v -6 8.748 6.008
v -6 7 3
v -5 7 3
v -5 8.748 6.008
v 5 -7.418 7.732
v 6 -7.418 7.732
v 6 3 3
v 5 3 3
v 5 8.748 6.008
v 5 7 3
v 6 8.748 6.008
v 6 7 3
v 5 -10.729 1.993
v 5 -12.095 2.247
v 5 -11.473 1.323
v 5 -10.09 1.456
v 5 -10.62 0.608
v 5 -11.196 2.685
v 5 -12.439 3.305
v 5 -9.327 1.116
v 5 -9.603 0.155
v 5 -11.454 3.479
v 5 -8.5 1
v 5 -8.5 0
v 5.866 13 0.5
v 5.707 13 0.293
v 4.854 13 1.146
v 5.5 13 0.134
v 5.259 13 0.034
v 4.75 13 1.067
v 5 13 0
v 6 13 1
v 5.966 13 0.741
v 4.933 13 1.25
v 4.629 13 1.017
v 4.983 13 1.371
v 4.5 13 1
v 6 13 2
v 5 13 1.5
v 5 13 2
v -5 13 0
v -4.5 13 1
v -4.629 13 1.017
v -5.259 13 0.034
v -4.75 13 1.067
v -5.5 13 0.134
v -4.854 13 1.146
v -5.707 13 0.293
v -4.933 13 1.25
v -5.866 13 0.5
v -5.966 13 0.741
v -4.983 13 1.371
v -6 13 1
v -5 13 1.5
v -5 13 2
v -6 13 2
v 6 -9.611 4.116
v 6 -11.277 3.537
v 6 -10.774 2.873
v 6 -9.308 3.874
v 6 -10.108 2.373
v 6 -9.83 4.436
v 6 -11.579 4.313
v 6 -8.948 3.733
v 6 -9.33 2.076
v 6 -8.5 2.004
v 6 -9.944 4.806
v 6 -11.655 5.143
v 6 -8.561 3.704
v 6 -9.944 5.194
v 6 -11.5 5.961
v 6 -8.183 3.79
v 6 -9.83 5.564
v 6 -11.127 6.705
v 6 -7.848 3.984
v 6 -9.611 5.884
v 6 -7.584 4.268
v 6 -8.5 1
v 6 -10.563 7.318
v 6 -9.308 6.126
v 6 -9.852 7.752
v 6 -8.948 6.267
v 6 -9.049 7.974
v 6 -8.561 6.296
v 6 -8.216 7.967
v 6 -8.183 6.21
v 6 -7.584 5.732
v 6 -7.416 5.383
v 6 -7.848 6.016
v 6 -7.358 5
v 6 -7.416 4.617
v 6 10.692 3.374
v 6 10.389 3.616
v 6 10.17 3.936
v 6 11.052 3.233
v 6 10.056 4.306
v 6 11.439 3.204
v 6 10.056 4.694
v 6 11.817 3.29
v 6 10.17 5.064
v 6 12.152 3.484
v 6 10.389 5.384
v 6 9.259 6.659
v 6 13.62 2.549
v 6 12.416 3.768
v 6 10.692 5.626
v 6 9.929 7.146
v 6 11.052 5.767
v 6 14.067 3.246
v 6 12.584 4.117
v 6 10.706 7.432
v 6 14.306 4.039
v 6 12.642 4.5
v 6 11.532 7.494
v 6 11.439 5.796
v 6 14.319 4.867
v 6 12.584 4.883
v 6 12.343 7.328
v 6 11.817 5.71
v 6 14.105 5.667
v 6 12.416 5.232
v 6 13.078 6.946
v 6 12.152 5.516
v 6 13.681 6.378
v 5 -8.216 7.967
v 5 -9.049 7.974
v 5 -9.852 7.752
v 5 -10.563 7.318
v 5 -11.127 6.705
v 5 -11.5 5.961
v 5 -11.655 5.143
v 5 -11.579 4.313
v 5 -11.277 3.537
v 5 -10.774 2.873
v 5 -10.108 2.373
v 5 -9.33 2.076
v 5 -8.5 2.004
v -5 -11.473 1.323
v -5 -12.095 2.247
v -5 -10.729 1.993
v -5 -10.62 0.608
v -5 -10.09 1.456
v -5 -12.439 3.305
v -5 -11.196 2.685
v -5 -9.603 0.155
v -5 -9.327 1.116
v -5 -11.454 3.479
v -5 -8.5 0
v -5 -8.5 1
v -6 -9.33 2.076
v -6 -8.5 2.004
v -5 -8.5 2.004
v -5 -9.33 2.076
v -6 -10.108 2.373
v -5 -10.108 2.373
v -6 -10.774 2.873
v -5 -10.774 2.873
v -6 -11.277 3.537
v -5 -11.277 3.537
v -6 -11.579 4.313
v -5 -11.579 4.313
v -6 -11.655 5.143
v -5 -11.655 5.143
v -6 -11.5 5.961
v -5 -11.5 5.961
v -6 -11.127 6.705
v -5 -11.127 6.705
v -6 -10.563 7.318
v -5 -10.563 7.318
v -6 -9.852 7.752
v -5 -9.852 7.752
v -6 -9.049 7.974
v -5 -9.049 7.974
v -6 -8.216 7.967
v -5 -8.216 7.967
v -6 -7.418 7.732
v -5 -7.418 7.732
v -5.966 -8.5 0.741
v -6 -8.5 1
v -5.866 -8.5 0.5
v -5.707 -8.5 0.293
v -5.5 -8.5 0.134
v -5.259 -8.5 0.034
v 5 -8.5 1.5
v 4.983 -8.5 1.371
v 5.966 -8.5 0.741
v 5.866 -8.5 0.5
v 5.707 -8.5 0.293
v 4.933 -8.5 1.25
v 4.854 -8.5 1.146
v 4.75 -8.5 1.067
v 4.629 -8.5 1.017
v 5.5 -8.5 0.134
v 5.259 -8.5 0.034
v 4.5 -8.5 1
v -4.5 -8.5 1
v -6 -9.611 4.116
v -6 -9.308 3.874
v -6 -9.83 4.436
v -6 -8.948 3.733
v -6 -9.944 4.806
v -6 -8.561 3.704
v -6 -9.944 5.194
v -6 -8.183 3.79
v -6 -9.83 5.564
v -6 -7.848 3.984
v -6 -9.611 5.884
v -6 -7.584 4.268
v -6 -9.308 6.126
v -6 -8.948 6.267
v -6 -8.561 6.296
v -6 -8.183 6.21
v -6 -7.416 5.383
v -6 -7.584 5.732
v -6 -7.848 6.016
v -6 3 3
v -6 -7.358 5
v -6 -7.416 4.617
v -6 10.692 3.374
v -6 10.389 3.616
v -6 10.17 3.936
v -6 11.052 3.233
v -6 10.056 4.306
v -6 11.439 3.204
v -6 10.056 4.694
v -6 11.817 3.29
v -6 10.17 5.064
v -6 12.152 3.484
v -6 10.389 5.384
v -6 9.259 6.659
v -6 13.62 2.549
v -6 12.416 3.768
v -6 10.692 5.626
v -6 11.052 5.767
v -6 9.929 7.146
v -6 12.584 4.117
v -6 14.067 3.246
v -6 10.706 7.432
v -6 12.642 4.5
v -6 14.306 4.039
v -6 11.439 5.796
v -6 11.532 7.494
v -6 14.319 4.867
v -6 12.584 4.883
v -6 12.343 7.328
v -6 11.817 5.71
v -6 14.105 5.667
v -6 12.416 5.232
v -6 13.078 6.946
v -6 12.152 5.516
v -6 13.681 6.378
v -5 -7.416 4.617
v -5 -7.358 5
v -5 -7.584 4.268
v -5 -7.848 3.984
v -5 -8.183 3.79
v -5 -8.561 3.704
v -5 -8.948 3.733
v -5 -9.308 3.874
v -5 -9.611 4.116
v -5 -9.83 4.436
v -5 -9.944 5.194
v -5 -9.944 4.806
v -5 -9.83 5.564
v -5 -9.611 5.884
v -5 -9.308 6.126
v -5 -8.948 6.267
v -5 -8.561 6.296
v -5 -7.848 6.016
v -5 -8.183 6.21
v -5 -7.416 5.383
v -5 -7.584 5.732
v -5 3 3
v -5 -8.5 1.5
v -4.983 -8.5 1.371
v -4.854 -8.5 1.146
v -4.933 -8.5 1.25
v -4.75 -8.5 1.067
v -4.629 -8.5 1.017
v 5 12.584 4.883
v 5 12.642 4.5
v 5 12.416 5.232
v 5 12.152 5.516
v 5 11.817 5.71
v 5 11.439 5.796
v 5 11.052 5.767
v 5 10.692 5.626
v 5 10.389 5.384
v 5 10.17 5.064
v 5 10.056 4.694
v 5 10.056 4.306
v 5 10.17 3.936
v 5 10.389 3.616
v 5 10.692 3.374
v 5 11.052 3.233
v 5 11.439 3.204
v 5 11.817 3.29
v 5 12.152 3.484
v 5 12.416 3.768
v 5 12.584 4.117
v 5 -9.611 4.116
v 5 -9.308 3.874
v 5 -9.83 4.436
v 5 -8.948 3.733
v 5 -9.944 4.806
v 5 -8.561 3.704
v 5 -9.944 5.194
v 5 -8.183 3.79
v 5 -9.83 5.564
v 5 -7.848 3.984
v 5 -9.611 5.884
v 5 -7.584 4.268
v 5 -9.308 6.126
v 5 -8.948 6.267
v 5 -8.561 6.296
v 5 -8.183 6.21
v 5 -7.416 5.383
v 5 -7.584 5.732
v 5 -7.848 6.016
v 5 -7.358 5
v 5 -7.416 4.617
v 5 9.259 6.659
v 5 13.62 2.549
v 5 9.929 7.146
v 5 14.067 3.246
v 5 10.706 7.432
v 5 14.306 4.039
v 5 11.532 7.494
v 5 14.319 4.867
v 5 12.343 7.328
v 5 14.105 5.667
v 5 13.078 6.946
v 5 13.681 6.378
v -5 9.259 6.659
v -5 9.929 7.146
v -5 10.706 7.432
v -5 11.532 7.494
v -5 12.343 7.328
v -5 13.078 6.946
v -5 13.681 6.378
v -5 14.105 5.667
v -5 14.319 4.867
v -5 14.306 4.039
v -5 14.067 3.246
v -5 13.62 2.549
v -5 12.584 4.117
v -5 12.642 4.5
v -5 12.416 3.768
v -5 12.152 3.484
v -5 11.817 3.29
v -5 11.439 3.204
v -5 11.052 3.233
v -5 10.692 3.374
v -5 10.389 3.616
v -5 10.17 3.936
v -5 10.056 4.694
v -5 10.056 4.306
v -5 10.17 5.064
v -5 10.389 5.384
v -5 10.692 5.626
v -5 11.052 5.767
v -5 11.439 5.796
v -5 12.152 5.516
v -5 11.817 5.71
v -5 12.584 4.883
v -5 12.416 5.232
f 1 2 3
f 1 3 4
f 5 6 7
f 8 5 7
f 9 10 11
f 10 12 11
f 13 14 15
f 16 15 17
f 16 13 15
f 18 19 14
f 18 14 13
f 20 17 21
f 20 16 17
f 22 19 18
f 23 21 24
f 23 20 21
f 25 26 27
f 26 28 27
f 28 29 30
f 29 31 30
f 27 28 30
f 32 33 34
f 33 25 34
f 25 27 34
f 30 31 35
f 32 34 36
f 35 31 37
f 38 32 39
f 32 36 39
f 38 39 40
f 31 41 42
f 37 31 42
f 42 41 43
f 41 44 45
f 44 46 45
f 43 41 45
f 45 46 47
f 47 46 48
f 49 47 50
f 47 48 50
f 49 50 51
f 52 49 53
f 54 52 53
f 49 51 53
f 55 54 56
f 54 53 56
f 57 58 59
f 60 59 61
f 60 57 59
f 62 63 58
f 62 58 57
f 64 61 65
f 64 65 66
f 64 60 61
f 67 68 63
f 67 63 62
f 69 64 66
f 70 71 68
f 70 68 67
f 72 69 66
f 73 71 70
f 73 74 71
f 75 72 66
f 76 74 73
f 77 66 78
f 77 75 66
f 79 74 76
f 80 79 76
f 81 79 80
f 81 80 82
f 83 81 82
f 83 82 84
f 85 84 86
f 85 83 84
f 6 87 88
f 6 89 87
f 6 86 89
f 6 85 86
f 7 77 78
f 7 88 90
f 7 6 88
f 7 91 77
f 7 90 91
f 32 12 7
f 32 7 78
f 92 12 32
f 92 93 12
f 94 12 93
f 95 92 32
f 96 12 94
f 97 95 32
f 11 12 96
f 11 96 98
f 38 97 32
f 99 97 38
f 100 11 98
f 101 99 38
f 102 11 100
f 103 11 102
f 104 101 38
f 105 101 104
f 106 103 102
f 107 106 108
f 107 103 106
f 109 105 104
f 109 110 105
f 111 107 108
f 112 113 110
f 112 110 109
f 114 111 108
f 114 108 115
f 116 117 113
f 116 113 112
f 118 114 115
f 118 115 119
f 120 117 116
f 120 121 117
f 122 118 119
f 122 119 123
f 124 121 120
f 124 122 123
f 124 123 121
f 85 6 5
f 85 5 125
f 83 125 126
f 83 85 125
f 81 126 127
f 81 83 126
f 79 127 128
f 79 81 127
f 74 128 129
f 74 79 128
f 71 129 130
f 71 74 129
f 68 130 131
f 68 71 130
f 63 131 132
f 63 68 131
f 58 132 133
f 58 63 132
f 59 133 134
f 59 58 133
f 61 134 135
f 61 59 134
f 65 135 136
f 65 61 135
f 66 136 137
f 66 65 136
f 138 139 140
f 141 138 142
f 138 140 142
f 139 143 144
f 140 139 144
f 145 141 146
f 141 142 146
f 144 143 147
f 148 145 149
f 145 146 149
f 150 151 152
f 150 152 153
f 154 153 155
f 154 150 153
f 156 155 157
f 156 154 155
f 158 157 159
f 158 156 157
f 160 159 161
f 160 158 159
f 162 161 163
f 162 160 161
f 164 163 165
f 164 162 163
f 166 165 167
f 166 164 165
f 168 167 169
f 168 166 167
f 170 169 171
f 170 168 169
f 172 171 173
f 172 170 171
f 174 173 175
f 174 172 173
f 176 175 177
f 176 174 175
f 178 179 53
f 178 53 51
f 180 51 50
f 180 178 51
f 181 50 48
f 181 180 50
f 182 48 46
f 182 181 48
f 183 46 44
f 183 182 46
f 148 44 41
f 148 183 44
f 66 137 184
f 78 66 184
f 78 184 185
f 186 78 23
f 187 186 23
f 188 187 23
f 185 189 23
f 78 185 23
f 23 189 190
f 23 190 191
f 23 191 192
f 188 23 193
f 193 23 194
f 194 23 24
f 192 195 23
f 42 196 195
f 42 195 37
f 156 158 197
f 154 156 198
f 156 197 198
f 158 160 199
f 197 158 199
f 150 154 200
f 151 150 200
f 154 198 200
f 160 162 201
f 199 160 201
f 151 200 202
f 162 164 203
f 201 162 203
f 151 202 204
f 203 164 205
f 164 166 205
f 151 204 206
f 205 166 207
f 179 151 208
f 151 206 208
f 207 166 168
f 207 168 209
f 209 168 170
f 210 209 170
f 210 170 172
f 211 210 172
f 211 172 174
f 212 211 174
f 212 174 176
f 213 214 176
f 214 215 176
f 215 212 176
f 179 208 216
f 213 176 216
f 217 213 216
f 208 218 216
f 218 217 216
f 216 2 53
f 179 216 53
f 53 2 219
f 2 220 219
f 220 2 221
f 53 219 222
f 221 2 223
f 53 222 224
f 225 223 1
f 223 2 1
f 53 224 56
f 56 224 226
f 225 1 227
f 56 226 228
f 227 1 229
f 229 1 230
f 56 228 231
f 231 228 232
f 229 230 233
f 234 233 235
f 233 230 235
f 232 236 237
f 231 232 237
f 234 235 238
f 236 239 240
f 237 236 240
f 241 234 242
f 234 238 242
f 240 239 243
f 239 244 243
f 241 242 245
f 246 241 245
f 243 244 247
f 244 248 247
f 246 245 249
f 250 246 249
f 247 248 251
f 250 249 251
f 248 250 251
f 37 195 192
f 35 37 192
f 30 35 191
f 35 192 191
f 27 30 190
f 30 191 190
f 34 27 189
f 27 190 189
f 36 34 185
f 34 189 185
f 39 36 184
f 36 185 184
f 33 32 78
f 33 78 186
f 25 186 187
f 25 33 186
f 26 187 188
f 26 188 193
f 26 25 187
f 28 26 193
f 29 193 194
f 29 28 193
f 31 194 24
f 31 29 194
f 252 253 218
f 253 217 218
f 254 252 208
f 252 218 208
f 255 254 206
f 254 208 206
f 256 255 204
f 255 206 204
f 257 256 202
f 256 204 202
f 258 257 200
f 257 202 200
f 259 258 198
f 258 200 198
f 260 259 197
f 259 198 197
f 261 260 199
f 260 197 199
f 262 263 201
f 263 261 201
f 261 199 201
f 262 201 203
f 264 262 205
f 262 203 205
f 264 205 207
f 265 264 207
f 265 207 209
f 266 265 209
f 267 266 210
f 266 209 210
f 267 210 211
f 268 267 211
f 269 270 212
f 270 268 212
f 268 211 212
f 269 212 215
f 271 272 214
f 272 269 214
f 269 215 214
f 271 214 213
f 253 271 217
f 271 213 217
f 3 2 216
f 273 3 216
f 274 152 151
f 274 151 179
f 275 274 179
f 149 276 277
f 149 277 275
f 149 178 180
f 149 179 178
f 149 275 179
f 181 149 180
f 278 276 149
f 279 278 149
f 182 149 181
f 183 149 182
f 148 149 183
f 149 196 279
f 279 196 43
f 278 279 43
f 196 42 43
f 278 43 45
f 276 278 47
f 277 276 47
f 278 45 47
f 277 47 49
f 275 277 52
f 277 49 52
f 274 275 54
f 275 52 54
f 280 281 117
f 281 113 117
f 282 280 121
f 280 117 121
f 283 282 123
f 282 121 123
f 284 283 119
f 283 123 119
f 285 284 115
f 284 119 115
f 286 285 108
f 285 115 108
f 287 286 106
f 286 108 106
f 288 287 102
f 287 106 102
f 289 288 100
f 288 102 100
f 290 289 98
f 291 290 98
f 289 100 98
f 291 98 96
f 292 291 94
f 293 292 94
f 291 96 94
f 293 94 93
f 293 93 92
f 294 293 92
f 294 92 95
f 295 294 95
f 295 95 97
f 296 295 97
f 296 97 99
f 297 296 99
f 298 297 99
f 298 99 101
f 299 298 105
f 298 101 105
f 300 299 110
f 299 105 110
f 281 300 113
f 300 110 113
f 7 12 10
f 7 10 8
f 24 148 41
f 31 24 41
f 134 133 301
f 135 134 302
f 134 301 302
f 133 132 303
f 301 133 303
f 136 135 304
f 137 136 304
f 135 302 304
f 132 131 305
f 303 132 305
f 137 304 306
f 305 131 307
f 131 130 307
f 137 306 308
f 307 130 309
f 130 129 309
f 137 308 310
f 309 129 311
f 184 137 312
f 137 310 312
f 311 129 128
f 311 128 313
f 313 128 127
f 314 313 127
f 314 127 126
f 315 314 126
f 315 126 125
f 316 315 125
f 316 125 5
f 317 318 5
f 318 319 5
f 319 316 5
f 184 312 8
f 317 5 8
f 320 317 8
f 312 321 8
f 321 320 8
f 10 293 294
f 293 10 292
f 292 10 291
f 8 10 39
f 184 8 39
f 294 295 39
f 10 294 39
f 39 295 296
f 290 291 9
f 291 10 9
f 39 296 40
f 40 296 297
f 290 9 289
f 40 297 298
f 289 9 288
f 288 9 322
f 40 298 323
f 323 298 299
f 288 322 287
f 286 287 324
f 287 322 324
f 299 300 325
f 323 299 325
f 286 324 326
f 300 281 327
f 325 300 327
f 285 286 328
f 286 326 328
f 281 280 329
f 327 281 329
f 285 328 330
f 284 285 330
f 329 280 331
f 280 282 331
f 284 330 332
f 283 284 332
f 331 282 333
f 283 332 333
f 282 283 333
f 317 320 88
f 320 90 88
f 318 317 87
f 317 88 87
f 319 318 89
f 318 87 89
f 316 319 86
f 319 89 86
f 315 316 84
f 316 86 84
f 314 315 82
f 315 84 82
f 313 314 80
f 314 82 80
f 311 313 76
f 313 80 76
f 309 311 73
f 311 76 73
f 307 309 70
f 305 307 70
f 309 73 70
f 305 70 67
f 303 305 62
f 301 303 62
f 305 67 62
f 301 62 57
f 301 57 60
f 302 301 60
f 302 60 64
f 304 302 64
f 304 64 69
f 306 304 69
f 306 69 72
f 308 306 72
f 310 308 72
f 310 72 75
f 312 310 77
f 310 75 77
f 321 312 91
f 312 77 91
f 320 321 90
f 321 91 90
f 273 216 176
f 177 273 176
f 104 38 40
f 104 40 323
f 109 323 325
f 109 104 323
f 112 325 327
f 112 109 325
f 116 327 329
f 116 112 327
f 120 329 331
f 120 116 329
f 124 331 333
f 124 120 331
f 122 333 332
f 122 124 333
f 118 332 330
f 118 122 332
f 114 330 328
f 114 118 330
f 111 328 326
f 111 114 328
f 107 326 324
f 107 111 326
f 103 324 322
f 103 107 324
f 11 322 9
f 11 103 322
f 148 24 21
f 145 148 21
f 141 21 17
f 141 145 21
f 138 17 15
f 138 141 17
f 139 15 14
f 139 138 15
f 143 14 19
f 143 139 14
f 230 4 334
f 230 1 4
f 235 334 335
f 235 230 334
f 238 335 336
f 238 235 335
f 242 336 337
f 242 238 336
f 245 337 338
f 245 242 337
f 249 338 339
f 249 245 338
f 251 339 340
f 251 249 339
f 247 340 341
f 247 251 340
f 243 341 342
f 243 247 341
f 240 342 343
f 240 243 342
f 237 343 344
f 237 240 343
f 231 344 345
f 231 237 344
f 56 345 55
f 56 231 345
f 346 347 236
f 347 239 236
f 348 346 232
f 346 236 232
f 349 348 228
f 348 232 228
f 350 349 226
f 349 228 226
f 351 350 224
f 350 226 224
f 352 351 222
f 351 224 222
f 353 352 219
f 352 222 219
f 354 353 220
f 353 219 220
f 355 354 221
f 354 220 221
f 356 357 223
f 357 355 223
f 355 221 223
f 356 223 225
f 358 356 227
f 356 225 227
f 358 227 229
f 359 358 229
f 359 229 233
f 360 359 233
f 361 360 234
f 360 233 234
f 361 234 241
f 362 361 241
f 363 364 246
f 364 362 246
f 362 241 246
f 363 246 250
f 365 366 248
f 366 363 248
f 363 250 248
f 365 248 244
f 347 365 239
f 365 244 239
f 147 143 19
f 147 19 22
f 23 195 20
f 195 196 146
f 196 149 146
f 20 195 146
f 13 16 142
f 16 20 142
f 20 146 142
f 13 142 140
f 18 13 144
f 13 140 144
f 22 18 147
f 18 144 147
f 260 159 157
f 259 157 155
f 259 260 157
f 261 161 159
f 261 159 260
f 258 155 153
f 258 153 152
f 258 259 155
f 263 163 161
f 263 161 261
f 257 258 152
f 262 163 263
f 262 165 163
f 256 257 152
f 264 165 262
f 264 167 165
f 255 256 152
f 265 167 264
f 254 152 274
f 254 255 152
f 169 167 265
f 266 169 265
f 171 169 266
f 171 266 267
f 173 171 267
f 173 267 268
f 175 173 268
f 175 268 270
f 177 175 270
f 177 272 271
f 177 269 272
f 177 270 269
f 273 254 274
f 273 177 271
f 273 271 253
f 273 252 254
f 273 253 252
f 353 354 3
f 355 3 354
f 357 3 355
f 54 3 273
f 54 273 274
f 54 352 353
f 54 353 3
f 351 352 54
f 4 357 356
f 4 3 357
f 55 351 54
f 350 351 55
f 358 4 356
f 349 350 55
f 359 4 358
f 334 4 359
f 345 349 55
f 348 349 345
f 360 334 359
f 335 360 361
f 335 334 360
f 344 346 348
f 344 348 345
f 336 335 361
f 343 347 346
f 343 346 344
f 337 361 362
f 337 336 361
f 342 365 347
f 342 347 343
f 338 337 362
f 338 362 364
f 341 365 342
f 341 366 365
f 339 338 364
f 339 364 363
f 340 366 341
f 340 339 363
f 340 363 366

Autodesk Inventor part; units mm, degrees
ref_plane "YZ Plane" through (0, 0, 0) normal (1, 0, 0) x (0, 1, 0)
ref_plane "XZ Plane" through (0, 0, 0) normal (0, 1, 0) x (-1, 0, 0)
ref_plane "XY Plane" through (0, 0, 0) normal (0, 0, 1) x (1, 0, 0)
sketch "Sketch2" plane through (0, 0, 0) normal (1, 0, 0) x (0, 1, 0)
  line L0 (0, 10.4889) -> (0, -1.7482) projected
  line L1 (-17.7123, 0) -> (21.1316, 0) projected
  line L2 (13, 0) -> (13, 2)
  arc A0 (-7.4177, 7.7315) -> (-8.5, 2.0042) centre (-8.6583, 5) ccw
  line L3 (-8.5, 2.0042) -> (-8.5, 0)
  line L4 (7, 3) -> (8.7479, 6.0075)
  arc A1 (13, 2) -> (8.7479, 6.0075) centre (11.3417, 4.5) ccw
  circle A2 centre (11.3417, 4.5) radius 1.3
  circle A3 centre (-8.6583, 5) radius 1.3
  line L5 (7, 3) -> (3, 3)
  line L6 (3, 3) -> (-7.4177, 7.7315)
  dimension "d0" = 21.5
  dimension "d2" = 3
  dimension "d3" = 2
  dimension "d6" = 3
  dimension "d7" = 4.5
  dimension "d8" = 1.6583
  dimension "d9" = 5
  dimension "d10" = 20
  dimension "d16" = 3
  dimension "d17" = 2.6
  dimension "d30" = 13
  dimension "d31" = 4
  dimension "d32" = 6
extrude "Extrusion1" add sketch "Sketch2" along normal mid plane 12
fillet "Fillet1" radius 1 2 edges at (6, 2.25, 0) (-6, 2.25, 0)
shell "Shell1" thickness 1 removed faces 9 at (2, -9.3053, 7.9294) at (2, 8.1653, 5.005) at (2, 13.3771, 2.2962) at (1.6667, -8.5, 1.3361) at (-1.6667, 13, 1.3333) at (2, 12.6249, 4.2915) at (2, -7.3751, 4.7915) at (-2, -3.9452, 6.1543) at (-2, 4.3333, 3)
sketch "Sketch4" plane through (0, 0, 0) normal (1, 0, 0) x (0, 1, 0)
  arc A0 (-11.4544, 3.4791) -> (-8.5, 1) centre (-8.5, 4) ccw
  arc A1 (-12.4392, 3.3054) -> (-8.5, 0) centre (-8.5, 4) ccw
  line L0 (-12.4392, 3.3054) -> (-11.4544, 3.4791)
  line L1 (-8.5, 1) -> (-8.5, 0)
  line L2 (-8.5, 0) -> (-8.5, 1) projected
  line L3 (-8.5, 0) -> (13, 0) projected
  line L4 (13, 1) -> (-8.5, 1) projected
  dimension "d40" = 3
  dimension "d42" = 1
  dimension "d43" = 80
extrude "Extrusion3" add sketch "Sketch4" along normal mid plane 10
fillet "Fillet2" radius 0.5 2 edges at (-5, 2.25, 1) (5, 2.25, 1)
properties part number "Linkage for 45 degree hinge" material "Steel"
